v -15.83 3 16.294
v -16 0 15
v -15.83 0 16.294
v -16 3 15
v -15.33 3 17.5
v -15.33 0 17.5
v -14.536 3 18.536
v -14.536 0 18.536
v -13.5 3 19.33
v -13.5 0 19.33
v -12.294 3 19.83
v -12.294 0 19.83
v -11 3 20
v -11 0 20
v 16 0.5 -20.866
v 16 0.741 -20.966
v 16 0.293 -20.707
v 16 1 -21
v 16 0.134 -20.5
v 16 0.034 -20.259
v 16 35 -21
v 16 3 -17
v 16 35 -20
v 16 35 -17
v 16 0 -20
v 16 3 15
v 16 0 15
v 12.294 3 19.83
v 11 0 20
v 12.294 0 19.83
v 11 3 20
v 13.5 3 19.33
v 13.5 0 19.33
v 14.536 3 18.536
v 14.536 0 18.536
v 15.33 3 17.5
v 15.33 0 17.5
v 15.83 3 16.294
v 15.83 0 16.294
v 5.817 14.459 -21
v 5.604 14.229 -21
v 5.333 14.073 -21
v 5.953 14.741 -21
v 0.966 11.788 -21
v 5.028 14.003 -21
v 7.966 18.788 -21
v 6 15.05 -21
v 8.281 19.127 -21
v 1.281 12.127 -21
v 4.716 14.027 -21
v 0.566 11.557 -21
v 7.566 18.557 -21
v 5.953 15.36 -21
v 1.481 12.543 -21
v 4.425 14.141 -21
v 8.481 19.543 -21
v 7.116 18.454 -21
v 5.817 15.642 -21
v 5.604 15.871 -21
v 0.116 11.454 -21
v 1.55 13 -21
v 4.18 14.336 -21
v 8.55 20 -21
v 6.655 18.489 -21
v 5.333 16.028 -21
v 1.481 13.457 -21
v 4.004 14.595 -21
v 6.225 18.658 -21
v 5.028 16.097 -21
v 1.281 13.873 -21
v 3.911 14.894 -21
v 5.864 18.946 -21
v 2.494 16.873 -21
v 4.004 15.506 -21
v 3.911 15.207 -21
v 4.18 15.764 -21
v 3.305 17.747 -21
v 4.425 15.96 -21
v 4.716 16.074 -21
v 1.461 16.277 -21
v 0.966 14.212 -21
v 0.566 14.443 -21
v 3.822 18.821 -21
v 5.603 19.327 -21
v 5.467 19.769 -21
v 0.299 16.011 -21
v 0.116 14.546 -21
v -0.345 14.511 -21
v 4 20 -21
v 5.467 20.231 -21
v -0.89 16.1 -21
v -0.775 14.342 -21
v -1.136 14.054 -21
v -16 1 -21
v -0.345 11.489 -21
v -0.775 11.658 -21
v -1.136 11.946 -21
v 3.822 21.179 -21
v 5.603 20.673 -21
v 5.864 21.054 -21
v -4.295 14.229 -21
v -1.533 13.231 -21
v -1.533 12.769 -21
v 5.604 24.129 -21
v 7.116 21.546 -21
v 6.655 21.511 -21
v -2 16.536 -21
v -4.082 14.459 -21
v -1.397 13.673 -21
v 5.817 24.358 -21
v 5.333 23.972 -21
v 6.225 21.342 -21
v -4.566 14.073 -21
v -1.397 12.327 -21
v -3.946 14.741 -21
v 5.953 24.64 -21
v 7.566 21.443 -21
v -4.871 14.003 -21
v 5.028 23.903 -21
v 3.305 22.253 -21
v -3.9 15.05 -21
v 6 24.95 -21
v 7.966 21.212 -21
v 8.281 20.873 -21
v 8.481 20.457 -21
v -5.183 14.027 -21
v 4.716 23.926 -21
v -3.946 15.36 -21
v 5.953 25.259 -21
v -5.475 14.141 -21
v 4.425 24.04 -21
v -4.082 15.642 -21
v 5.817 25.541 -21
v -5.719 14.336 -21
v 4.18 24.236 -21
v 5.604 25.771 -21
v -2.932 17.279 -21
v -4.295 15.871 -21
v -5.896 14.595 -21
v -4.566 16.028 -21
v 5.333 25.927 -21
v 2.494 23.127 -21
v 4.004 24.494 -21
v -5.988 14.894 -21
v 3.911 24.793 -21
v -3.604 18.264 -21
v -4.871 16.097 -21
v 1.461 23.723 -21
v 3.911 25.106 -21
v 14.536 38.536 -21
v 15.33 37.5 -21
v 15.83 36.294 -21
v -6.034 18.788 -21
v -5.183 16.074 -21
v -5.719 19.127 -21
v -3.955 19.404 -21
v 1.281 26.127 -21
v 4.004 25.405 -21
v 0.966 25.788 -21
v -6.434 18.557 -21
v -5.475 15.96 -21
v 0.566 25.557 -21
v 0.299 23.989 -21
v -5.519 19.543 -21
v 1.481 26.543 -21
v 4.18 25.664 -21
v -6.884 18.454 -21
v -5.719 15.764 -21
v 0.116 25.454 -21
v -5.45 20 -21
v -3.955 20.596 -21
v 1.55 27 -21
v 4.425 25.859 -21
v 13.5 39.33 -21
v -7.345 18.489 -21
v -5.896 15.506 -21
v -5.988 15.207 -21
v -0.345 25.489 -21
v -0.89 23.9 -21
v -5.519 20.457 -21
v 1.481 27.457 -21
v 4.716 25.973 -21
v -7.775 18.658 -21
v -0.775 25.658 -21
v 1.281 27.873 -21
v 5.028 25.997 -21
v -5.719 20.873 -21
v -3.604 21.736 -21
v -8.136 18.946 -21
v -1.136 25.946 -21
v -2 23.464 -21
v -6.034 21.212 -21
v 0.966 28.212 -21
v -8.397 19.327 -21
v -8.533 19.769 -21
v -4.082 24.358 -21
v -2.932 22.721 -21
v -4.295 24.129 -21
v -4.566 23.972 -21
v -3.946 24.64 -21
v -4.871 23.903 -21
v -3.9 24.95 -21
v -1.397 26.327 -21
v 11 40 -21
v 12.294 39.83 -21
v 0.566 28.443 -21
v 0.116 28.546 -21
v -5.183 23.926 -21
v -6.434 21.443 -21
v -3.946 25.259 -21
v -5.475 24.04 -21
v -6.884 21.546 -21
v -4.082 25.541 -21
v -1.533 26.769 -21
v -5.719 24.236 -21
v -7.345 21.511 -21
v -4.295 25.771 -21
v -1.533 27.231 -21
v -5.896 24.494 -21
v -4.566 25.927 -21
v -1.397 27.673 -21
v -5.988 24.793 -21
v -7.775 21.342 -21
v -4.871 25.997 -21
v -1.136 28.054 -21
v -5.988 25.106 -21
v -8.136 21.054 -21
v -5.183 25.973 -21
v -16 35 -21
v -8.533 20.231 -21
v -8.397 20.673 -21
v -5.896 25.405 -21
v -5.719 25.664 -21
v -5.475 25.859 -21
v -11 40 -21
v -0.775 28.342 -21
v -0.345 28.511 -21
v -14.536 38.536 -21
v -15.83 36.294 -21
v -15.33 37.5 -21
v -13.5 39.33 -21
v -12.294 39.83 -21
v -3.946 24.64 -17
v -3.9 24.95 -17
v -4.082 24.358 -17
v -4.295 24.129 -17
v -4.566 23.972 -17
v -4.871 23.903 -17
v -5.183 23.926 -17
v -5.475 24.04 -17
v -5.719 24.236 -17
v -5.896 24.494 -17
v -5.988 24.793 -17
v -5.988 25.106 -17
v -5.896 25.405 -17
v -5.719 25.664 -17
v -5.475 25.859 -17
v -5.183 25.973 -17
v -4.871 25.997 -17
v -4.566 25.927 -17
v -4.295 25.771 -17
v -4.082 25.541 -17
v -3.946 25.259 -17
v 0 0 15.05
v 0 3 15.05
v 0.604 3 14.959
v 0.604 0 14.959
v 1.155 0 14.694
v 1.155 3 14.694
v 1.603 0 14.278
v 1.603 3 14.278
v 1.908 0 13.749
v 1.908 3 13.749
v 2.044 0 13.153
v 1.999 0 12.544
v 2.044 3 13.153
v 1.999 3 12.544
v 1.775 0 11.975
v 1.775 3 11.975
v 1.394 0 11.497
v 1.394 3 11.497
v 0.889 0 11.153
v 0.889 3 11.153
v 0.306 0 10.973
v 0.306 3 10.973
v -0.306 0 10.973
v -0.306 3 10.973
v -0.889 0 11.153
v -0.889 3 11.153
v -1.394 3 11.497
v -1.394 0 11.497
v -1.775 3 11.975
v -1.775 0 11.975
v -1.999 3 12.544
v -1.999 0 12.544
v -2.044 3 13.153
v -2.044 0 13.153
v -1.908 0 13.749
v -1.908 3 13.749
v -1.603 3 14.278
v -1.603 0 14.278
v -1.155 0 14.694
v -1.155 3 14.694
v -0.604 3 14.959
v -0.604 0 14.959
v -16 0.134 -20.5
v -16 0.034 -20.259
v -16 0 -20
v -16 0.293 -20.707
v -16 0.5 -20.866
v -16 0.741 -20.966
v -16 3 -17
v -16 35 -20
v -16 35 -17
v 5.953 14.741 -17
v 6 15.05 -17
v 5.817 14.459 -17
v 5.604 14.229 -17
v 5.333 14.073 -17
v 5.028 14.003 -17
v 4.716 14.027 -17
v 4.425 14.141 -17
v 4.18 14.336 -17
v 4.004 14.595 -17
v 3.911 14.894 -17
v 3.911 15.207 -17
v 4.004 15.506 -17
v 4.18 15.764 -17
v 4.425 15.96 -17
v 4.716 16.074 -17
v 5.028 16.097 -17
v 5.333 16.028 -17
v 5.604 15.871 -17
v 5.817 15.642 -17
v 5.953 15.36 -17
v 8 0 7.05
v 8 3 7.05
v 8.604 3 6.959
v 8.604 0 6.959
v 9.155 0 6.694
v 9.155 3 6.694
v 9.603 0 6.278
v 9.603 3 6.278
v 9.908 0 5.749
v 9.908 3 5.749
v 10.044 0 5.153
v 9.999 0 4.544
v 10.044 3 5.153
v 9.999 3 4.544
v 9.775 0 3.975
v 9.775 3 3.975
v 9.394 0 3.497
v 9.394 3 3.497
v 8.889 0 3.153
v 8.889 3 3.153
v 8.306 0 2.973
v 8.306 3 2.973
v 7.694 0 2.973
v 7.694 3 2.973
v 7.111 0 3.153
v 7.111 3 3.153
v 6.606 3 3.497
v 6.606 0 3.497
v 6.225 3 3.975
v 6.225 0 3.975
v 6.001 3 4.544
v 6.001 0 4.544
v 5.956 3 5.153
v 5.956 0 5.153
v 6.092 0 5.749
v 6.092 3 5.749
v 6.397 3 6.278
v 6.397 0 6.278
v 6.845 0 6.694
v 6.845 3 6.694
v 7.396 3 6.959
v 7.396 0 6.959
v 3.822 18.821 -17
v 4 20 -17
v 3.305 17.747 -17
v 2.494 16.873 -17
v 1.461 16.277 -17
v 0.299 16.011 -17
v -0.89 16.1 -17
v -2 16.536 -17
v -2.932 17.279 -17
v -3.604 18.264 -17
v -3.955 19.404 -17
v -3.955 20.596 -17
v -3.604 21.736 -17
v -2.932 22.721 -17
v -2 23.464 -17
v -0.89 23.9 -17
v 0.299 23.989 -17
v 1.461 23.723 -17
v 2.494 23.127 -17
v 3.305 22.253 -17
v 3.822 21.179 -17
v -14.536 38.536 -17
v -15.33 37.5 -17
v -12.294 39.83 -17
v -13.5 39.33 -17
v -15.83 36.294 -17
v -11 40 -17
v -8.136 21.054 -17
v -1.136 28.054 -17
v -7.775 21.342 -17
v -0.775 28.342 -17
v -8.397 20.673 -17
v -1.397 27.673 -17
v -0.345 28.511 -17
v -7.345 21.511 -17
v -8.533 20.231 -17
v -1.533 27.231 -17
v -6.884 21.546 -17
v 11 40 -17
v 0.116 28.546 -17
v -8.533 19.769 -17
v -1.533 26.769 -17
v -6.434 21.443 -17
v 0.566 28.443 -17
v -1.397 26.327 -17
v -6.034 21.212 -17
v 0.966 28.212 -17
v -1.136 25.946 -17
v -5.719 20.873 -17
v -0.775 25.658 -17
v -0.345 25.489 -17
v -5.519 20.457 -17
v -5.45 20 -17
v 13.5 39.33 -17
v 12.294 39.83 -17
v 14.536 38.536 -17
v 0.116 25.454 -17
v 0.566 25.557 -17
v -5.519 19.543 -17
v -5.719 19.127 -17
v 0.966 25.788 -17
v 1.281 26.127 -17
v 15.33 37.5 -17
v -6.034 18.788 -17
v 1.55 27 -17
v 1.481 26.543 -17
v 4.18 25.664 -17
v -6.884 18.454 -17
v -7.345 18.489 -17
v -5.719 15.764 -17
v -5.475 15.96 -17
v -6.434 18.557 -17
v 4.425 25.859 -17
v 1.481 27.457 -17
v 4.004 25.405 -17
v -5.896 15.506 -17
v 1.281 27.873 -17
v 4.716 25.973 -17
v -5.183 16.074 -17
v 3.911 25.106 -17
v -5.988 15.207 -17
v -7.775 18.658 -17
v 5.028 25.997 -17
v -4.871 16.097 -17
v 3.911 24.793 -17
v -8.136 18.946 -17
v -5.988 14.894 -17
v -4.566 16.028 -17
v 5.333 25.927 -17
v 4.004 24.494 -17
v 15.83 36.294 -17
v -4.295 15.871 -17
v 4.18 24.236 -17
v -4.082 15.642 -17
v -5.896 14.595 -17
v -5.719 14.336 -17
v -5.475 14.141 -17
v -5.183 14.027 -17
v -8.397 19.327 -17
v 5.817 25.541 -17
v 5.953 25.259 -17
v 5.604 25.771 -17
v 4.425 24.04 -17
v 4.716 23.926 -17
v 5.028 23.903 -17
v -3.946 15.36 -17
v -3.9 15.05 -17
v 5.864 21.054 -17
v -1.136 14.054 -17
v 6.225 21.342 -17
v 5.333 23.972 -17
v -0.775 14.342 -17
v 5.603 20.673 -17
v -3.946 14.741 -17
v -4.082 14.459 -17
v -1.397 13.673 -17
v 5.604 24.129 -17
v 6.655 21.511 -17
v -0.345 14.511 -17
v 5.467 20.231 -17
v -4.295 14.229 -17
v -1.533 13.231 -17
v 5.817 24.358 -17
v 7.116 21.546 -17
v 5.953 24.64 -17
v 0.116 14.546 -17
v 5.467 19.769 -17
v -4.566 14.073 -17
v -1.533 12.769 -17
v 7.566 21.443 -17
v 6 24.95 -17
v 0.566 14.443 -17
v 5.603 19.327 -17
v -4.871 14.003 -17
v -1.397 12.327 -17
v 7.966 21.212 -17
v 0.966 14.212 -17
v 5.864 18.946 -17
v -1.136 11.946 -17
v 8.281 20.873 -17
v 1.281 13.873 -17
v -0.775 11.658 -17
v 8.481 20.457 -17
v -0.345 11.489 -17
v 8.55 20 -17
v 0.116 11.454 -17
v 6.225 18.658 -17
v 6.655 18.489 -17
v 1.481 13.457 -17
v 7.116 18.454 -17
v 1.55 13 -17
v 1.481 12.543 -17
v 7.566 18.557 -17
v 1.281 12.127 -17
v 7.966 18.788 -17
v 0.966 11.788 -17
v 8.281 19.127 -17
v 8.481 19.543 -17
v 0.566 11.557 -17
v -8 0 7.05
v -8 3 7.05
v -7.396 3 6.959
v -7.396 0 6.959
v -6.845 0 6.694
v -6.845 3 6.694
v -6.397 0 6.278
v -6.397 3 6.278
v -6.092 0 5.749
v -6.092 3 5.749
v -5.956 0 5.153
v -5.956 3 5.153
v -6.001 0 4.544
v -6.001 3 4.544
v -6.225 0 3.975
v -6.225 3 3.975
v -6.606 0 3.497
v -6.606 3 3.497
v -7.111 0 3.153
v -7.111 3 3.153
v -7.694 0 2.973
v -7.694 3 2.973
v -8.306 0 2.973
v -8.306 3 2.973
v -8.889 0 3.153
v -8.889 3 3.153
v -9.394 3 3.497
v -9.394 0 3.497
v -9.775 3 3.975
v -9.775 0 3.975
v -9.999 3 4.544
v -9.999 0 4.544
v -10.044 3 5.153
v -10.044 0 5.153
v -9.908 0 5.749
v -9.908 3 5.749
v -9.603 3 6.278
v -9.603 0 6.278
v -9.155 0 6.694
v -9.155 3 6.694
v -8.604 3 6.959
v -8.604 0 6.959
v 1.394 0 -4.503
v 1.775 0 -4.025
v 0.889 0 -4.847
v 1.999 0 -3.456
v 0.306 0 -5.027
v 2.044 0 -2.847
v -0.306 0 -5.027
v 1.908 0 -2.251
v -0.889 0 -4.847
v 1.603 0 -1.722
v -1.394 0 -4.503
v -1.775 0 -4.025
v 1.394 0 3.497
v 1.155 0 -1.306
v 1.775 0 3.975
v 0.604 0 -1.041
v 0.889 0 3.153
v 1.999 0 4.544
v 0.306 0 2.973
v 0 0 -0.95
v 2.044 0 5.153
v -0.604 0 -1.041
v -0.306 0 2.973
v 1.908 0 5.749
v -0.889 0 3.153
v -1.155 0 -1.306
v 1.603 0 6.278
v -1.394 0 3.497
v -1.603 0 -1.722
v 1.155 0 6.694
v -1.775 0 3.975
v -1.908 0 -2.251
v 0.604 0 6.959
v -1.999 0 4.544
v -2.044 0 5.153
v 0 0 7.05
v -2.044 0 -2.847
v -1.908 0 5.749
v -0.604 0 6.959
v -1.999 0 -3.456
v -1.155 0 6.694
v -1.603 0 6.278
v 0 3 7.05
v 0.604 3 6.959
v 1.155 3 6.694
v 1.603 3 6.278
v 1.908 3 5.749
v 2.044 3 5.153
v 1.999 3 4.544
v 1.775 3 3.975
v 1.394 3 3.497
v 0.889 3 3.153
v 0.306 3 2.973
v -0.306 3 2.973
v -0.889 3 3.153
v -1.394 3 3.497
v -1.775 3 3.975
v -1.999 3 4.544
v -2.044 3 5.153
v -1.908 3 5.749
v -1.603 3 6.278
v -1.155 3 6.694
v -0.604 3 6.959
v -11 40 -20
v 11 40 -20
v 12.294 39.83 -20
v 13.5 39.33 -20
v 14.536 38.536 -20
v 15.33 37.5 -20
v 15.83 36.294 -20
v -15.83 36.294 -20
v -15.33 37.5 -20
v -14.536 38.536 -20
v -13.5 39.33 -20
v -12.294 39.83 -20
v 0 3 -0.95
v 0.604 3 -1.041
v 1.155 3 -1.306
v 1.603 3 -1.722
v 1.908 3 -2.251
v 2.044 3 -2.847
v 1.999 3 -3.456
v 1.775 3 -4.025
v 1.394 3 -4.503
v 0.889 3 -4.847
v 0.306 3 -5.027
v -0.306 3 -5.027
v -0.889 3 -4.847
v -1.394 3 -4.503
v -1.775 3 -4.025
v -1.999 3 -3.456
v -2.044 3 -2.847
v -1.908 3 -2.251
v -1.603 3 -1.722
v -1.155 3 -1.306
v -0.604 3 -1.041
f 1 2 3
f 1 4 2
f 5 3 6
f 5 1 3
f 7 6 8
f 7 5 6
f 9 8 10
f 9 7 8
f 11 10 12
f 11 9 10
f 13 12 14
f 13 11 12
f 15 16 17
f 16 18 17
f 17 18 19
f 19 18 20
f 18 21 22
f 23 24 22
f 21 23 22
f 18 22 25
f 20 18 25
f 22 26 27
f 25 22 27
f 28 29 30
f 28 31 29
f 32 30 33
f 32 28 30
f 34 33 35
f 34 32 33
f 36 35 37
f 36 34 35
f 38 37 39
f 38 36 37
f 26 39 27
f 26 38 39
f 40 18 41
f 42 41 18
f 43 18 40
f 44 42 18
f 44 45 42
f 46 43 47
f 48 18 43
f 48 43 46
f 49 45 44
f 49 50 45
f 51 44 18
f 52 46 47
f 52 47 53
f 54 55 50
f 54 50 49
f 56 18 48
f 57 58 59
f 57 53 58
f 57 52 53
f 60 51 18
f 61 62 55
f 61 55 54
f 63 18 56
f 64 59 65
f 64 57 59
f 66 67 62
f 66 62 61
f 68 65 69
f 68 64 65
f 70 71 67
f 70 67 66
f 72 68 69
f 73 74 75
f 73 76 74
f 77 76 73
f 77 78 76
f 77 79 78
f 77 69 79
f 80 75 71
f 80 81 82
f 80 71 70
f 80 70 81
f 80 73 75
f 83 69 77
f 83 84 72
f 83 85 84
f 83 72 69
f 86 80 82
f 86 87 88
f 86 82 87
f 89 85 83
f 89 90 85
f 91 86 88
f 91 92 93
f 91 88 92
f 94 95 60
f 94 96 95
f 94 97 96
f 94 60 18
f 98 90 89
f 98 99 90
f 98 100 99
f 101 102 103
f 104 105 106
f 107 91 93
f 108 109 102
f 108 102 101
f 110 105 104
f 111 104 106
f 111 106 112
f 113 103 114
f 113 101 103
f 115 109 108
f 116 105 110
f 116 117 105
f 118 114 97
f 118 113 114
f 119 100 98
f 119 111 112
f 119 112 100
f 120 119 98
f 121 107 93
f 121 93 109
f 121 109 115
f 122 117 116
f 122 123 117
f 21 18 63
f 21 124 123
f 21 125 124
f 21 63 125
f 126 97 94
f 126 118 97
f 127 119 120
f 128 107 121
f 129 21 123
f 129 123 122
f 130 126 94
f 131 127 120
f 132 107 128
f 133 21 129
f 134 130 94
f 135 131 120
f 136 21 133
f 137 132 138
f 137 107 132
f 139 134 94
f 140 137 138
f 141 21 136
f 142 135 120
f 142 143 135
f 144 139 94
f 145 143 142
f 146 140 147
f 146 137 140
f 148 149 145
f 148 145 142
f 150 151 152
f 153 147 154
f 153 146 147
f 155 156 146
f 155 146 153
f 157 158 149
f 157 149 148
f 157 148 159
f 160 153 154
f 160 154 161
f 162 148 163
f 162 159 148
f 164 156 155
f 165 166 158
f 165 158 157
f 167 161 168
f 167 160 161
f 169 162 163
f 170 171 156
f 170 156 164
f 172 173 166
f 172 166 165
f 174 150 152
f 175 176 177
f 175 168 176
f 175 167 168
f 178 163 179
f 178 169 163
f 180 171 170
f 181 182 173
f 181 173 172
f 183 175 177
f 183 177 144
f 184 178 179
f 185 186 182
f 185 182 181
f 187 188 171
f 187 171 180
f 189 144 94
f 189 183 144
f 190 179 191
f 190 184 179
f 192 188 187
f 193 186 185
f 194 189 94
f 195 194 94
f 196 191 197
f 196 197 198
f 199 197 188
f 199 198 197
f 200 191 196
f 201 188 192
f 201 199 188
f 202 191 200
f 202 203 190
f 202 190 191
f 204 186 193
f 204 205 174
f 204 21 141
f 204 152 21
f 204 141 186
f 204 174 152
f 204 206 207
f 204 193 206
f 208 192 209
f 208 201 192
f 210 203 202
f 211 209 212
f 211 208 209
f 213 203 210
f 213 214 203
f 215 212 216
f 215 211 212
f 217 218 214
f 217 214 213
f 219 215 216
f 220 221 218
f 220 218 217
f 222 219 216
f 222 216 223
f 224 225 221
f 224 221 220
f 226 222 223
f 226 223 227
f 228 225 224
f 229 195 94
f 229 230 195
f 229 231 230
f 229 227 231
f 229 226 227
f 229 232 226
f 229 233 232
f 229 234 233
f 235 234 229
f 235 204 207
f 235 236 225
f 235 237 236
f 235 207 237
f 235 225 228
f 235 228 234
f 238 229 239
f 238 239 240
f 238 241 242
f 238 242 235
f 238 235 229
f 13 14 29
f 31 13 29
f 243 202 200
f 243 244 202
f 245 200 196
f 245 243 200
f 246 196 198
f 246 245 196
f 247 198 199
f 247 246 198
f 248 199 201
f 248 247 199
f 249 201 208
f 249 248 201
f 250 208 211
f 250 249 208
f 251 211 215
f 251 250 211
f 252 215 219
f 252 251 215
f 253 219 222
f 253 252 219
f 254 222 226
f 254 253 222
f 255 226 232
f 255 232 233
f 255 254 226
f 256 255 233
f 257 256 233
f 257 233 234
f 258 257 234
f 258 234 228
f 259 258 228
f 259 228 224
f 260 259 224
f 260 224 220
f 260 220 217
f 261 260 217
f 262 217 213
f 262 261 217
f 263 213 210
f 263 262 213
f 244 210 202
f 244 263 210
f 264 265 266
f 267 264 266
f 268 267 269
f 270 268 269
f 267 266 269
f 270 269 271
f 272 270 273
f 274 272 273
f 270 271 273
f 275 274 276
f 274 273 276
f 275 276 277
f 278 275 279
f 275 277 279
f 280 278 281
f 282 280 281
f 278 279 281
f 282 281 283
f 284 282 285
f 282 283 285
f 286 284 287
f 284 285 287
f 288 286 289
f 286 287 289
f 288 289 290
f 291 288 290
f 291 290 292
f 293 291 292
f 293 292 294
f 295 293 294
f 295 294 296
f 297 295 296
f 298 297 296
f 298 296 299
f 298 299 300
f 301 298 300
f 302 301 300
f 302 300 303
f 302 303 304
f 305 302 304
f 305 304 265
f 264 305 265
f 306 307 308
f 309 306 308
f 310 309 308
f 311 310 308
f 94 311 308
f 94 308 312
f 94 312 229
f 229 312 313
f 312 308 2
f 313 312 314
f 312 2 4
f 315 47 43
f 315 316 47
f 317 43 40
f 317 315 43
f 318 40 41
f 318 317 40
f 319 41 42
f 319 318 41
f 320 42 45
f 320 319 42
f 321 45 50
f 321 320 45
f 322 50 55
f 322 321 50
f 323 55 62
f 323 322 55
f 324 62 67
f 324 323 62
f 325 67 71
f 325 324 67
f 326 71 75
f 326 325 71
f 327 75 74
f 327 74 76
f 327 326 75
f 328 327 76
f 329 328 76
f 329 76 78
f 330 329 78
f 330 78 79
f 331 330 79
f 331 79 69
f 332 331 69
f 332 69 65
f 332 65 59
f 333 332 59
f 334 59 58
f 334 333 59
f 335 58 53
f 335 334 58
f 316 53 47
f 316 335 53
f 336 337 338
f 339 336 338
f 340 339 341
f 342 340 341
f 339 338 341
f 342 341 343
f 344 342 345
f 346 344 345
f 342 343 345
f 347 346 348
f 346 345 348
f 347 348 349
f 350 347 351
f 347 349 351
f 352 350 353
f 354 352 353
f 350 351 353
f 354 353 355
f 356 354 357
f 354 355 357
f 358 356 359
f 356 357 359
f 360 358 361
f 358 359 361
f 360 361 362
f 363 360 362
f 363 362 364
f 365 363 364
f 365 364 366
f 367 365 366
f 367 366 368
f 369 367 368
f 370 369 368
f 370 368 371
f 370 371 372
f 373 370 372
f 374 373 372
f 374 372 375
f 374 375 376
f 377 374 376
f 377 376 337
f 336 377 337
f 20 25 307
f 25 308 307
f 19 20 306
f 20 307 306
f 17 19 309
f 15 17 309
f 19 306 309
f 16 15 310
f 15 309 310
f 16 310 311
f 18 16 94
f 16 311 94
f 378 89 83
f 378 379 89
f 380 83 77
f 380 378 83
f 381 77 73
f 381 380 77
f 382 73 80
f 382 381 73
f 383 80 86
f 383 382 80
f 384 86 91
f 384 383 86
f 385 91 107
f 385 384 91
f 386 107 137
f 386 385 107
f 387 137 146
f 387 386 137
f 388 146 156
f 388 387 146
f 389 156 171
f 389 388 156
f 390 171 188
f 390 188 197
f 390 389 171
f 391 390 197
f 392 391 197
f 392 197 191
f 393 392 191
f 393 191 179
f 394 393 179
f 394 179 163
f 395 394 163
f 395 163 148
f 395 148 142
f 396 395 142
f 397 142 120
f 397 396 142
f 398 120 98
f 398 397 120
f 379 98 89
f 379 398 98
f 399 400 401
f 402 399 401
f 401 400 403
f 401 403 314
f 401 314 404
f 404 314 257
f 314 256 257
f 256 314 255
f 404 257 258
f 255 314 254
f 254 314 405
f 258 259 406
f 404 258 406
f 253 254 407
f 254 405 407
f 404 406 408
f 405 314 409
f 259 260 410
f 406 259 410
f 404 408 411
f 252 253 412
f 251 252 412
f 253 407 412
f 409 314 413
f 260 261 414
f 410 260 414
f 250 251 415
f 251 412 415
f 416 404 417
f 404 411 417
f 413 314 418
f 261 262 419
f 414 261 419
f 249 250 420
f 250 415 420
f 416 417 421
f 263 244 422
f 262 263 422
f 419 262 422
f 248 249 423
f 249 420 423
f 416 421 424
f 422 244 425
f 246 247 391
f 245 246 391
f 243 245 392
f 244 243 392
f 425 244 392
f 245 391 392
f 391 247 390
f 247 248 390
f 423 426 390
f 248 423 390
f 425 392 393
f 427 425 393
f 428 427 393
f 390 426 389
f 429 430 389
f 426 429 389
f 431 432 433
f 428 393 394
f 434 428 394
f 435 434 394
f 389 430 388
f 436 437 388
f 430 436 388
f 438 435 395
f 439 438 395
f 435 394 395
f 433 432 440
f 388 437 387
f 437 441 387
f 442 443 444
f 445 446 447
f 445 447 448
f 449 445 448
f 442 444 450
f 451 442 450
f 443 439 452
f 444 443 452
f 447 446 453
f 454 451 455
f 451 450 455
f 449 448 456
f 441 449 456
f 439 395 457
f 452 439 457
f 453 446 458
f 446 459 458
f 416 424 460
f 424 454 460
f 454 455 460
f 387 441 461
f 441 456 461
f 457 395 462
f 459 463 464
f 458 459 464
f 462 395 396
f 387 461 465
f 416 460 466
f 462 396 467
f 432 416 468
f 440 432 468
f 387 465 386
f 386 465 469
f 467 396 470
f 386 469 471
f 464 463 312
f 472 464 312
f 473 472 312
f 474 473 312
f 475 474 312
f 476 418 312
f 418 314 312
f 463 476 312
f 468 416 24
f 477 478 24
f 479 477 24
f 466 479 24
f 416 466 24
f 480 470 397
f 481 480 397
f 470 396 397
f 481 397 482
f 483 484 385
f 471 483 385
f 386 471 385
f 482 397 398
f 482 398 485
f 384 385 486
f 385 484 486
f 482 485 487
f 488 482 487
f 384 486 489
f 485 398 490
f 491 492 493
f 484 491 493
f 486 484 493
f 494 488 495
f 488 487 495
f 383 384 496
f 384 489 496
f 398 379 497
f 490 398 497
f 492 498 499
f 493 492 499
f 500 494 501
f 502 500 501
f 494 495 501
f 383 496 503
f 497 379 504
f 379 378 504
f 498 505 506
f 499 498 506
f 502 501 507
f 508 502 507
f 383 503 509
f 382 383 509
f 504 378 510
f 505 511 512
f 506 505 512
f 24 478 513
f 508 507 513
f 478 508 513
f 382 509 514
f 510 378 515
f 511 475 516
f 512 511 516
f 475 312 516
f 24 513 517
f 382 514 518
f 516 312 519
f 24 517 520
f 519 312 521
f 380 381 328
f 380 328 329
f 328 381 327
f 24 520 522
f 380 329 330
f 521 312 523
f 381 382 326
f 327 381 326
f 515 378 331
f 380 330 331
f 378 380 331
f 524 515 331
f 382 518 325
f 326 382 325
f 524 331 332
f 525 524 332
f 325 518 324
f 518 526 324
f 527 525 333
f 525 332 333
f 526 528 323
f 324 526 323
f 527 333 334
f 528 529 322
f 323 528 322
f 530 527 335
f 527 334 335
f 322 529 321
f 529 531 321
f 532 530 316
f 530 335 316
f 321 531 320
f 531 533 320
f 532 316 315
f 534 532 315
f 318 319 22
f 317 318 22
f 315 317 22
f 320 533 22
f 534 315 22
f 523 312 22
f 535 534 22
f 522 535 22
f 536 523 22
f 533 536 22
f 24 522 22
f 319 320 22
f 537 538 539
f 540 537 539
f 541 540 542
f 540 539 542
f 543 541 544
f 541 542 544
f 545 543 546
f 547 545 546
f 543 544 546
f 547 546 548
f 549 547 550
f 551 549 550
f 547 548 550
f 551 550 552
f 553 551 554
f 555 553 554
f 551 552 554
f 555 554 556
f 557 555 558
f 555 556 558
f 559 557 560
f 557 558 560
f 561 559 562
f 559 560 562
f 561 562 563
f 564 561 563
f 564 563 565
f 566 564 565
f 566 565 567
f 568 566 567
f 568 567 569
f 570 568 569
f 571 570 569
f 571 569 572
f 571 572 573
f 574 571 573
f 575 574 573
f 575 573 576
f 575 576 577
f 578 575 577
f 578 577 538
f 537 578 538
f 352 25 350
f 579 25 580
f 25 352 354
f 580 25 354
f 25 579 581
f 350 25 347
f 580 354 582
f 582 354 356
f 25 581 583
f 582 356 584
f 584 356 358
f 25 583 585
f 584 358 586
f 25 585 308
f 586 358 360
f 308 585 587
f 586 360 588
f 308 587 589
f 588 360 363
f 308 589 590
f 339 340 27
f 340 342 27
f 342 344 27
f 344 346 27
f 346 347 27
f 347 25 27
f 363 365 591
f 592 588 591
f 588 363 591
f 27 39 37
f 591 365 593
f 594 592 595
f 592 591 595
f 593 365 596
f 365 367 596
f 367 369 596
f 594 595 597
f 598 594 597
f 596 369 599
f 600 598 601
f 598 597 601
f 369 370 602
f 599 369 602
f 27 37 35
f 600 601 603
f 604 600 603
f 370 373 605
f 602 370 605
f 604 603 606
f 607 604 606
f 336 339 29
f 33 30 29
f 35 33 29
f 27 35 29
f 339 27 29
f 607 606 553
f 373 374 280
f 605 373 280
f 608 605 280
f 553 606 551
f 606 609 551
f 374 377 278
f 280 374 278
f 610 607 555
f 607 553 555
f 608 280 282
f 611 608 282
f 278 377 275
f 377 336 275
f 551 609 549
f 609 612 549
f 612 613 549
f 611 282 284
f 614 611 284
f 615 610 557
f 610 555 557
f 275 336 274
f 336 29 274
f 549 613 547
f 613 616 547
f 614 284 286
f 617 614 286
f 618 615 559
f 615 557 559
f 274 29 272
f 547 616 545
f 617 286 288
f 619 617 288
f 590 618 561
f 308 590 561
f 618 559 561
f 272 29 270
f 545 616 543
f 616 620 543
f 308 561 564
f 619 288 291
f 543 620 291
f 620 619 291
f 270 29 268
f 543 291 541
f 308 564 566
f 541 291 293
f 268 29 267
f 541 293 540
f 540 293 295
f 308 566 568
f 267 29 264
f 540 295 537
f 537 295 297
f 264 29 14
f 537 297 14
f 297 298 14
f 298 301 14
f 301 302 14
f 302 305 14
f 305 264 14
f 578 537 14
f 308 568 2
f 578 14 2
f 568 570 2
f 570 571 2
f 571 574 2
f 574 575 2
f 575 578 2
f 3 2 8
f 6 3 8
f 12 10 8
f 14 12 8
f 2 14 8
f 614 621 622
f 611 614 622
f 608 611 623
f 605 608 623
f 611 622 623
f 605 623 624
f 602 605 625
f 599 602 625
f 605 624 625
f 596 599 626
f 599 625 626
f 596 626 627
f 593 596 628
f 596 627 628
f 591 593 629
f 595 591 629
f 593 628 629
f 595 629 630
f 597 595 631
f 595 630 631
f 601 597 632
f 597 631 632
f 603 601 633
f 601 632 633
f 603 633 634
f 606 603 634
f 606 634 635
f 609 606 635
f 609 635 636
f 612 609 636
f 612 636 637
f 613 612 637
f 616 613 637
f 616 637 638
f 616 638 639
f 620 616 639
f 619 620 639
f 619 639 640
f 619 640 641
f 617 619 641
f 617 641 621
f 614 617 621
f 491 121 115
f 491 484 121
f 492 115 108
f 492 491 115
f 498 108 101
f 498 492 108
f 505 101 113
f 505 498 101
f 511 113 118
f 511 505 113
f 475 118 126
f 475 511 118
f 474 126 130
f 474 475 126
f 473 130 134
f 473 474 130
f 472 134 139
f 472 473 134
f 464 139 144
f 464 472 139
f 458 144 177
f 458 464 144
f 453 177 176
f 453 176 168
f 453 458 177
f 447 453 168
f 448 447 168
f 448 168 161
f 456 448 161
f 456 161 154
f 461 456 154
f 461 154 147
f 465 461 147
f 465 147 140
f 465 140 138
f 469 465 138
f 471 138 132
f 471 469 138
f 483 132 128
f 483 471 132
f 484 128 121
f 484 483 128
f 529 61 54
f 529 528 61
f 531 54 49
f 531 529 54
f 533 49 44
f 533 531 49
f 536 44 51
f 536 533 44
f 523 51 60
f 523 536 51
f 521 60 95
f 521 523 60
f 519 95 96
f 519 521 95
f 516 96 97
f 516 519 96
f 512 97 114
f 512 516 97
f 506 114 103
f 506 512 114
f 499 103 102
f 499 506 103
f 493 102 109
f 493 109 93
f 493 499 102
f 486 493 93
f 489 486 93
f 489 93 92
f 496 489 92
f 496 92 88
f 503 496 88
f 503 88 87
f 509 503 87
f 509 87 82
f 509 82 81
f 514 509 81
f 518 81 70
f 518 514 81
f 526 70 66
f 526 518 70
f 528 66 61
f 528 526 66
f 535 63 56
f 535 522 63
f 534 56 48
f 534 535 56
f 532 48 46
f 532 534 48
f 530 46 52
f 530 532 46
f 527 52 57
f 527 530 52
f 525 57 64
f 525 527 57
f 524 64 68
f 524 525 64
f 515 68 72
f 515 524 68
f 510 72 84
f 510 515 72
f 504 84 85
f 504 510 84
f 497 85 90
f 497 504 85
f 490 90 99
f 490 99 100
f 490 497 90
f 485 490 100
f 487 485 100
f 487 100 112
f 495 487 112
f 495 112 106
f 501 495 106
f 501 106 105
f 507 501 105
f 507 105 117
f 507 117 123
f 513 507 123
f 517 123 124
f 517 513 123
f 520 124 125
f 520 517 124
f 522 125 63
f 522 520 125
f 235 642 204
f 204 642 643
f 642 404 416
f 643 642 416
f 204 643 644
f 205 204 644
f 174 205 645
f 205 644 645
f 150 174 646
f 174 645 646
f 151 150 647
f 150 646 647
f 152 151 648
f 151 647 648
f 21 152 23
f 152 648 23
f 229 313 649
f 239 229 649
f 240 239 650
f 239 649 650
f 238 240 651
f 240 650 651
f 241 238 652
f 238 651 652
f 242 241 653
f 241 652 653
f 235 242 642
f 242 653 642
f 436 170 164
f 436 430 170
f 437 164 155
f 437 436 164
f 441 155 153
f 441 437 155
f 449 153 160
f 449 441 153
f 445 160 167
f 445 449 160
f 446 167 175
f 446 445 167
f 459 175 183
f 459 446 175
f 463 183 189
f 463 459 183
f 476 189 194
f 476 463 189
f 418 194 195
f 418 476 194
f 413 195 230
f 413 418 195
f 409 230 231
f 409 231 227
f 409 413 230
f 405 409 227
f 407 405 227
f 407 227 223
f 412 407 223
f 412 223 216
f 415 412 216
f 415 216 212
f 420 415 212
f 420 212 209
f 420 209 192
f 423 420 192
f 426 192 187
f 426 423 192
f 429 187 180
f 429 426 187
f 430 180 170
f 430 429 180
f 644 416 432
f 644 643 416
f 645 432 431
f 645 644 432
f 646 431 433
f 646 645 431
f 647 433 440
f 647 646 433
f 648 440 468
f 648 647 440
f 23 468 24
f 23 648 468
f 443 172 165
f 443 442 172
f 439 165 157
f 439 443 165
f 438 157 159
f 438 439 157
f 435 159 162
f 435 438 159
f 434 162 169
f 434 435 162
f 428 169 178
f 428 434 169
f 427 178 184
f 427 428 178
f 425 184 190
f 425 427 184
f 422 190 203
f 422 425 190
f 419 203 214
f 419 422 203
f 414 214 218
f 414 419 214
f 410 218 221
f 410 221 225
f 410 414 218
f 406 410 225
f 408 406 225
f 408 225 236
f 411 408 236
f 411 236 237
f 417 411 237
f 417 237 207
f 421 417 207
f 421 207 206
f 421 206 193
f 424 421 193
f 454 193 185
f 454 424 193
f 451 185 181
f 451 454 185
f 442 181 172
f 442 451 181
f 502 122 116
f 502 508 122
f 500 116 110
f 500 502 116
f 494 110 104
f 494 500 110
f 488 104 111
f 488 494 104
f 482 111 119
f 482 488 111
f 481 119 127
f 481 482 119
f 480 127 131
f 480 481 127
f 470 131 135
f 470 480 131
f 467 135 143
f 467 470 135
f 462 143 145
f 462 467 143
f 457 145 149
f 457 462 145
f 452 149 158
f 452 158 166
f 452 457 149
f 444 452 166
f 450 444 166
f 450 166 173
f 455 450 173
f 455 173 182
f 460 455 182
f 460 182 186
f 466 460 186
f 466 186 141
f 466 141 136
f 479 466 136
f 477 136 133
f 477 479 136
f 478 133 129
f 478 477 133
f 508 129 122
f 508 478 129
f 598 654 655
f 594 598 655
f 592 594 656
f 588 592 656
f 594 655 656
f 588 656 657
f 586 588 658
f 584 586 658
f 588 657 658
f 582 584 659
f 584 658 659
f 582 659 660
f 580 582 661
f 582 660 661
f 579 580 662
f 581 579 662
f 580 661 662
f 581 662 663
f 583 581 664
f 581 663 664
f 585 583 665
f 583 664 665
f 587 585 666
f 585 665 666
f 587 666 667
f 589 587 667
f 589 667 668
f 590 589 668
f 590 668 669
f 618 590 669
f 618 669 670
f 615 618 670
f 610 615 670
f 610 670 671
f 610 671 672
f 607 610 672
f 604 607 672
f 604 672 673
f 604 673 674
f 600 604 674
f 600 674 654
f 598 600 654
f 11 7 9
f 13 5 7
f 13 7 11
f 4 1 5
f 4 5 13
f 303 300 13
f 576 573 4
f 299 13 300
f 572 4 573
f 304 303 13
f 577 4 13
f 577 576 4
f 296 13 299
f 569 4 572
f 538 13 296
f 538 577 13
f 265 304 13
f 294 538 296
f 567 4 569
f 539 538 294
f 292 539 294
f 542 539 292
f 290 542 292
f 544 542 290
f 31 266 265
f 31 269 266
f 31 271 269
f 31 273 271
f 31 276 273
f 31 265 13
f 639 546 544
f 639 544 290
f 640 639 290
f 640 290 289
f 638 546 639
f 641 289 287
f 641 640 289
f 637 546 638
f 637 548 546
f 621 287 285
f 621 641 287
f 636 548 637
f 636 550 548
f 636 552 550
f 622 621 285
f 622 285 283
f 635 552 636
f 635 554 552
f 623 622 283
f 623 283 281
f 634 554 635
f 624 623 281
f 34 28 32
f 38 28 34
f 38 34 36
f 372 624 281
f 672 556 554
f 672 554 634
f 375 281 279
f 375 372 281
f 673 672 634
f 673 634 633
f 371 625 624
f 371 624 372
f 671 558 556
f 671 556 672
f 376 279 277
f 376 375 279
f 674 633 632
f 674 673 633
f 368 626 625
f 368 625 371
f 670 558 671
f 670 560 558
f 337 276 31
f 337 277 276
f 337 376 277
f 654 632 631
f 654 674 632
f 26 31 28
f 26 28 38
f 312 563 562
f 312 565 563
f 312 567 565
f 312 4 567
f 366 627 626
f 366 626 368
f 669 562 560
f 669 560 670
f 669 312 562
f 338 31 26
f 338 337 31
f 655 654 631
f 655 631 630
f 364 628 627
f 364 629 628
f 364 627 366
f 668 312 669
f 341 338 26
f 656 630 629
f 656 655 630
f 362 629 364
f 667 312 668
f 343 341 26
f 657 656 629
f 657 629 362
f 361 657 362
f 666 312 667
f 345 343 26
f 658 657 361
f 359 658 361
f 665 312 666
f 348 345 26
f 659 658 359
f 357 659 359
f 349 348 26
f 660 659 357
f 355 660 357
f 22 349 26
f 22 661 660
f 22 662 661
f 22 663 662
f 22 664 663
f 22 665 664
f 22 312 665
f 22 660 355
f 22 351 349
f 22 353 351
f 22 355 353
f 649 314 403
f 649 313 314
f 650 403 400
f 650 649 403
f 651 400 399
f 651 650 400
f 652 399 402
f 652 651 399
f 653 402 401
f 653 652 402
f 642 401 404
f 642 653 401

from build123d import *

# Parameters (mm, degrees)
SKETCH_2_W          = 32
SKETCH_2_H          = 40
EXTRUDE_1_DEPTH     = 3
SKETCH_3_W          = 32
SKETCH_3_H          = 3
EXTRUDE_2_DEPTH     = 37
SKETCH_4_R          = 4
SKETCH_4_R_2        = 1.55
SKETCH_4_R_3        = 1.05
CUT_EXTRUDE_1_DEPTH = 57.789083458
SKETCH_6_R          = 2.05
CUT_EXTRUDE_2_DEPTH = 46
FILLET_1_R          = 5
SKETCH_11_R         = 1.55
SKETCH_11_R_2       = 1.05
SKETCH_11_R_3       = 4
EXTRUDE_4_DEPTH     = 1
FILLET_3_R          = 1


with BuildPart() as part:
    # 草图2 → 凸台-拉伸1 (new body)
    with BuildSketch(Plane(origin=(0, 0, 0), x_dir=(1, 0, 0), z_dir=(0, 1, 0))):
        Rectangle(SKETCH_2_W, SKETCH_2_H)
    extrude(amount=EXTRUDE_1_DEPTH)

    # 草图3 → 凸台-拉伸2 (add)
    with BuildSketch(Plane(origin=(0, 3, 0), x_dir=(1, 0, 0), z_dir=(0, 1, 0))):
        with Locations((0, 18.5)):
            Rectangle(SKETCH_3_W, SKETCH_3_H)
    extrude(amount=EXTRUDE_2_DEPTH)

    # 草图4 → 切除-拉伸1 (cut, through all)
    with BuildSketch(Plane.XY.offset(-17)):
        with Locations((0, 20)):
            Circle(SKETCH_4_R)
        with Locations((7, 20)):
            Circle(SKETCH_4_R_2)
        with Locations((0, 13)):
            Circle(SKETCH_4_R_2)
        with Locations((-7, 20)):
            Circle(SKETCH_4_R_2)
        with Locations((0, 27)):
            Circle(SKETCH_4_R_2)
        with Locations((4.949747468, 24.949747468)):
            Circle(SKETCH_4_R_3)
        with Locations((4.949747468, 15.050252532)):
            Circle(SKETCH_4_R_3)
        with Locations((-4.949747468, 15.050252532)):
            Circle(SKETCH_4_R_3)
        with Locations((-4.949747468, 24.949747468)):
            Circle(SKETCH_4_R_3)
    extrude(amount=-CUT_EXTRUDE_1_DEPTH, mode=Mode.SUBTRACT)

    # 草图6 → 切除-拉伸2 (cut, through all)
    with BuildSketch(Plane(origin=(0, 3, 0), x_dir=(1, 0, 0), z_dir=(0, 1, 0))):
        with Locations(Location((0, -5, 0), (0, 0, 270))):
            Circle(SKETCH_6_R)
        with Locations(Location((-8, -5, 0), (0, 0, 270))):
            Circle(SKETCH_6_R)
        with Locations(Location((8, -5, 0), (0, 0, 270))):
            Circle(SKETCH_6_R)
        with Locations(Location((0, 3, 0), (0, 0, 270))):
            Circle(SKETCH_6_R)
        with Locations(Location((0, -13, 0), (0, 0, 270))):
            Circle(SKETCH_6_R)
    extrude(amount=-CUT_EXTRUDE_2_DEPTH, mode=Mode.SUBTRACT)

    # 圆角1
    fillet_1_edges = [part.edges().sort_by_distance(p)[0] for p in [
        (-16, 40, -18.5),
        (16, 40, -18.5),
        (16, 1.5, 20),
        (-16, 1.5, 20),
    ]]
    fillet(fillet_1_edges, radius=FILLET_1_R)

    # 草图11 → 凸台-拉伸4 (add)
    with BuildSketch(Plane(origin=(0, 0, -20), x_dir=(-1, 0, 0), z_dir=(0, 0, -1))):
        with BuildLine():
            Line((11, 40), (-11, 40))
            ThreePointArc((-11, 40), (-14.535533906, 38.535533906), (-16, 35))
            Line((-16, 35), (-16, 0))
            Line((-16, 0), (16, 0))
            Line((16, 0), (16, 35))
            ThreePointArc((16, 35), (14.535533906, 38.535533906), (11, 40))
        make_face()
        with Locations(Location((-7, 20, 0), (0, 0, 180))):
            Circle(SKETCH_11_R, mode=Mode.SUBTRACT)
        with Locations(Location((-4.949747468, 15.050252532, 0), (0, 0, 180))):
            Circle(SKETCH_11_R_2, mode=Mode.SUBTRACT)
        with Locations(Location((0, 13, 0), (0, 0, 180))):
            Circle(SKETCH_11_R, mode=Mode.SUBTRACT)
        with Locations(Location((0, 20, 0), (0, 0, 180))):
            Circle(SKETCH_11_R_3, mode=Mode.SUBTRACT)
        with Locations(Location((4.949747468, 15.050252532, 0), (0, 0, 180))):
            Circle(SKETCH_11_R_2, mode=Mode.SUBTRACT)
        with Locations(Location((7, 20, 0), (0, 0, 180))):
            Circle(SKETCH_11_R, mode=Mode.SUBTRACT)
        with Locations(Location((4.949747468, 24.949747468, 0), (0, 0, 180))):
            Circle(SKETCH_11_R_2, mode=Mode.SUBTRACT)
        with Locations(Location((-4.949747468, 24.949747468, 0), (0, 0, 180))):
            Circle(SKETCH_11_R_2, mode=Mode.SUBTRACT)
        with Locations(Location((0, 27, 0), (0, 0, 180))):
            Circle(SKETCH_11_R, mode=Mode.SUBTRACT)
    extrude(amount=EXTRUDE_4_DEPTH)

    # 圆角3
    fillet_3_edges = [part.edges().sort_by_distance(p)[0] for p in [
        (0, 0, -21),
    ]]
    fillet(fillet_3_edges, radius=FILLET_3_R)


solid = part.part
